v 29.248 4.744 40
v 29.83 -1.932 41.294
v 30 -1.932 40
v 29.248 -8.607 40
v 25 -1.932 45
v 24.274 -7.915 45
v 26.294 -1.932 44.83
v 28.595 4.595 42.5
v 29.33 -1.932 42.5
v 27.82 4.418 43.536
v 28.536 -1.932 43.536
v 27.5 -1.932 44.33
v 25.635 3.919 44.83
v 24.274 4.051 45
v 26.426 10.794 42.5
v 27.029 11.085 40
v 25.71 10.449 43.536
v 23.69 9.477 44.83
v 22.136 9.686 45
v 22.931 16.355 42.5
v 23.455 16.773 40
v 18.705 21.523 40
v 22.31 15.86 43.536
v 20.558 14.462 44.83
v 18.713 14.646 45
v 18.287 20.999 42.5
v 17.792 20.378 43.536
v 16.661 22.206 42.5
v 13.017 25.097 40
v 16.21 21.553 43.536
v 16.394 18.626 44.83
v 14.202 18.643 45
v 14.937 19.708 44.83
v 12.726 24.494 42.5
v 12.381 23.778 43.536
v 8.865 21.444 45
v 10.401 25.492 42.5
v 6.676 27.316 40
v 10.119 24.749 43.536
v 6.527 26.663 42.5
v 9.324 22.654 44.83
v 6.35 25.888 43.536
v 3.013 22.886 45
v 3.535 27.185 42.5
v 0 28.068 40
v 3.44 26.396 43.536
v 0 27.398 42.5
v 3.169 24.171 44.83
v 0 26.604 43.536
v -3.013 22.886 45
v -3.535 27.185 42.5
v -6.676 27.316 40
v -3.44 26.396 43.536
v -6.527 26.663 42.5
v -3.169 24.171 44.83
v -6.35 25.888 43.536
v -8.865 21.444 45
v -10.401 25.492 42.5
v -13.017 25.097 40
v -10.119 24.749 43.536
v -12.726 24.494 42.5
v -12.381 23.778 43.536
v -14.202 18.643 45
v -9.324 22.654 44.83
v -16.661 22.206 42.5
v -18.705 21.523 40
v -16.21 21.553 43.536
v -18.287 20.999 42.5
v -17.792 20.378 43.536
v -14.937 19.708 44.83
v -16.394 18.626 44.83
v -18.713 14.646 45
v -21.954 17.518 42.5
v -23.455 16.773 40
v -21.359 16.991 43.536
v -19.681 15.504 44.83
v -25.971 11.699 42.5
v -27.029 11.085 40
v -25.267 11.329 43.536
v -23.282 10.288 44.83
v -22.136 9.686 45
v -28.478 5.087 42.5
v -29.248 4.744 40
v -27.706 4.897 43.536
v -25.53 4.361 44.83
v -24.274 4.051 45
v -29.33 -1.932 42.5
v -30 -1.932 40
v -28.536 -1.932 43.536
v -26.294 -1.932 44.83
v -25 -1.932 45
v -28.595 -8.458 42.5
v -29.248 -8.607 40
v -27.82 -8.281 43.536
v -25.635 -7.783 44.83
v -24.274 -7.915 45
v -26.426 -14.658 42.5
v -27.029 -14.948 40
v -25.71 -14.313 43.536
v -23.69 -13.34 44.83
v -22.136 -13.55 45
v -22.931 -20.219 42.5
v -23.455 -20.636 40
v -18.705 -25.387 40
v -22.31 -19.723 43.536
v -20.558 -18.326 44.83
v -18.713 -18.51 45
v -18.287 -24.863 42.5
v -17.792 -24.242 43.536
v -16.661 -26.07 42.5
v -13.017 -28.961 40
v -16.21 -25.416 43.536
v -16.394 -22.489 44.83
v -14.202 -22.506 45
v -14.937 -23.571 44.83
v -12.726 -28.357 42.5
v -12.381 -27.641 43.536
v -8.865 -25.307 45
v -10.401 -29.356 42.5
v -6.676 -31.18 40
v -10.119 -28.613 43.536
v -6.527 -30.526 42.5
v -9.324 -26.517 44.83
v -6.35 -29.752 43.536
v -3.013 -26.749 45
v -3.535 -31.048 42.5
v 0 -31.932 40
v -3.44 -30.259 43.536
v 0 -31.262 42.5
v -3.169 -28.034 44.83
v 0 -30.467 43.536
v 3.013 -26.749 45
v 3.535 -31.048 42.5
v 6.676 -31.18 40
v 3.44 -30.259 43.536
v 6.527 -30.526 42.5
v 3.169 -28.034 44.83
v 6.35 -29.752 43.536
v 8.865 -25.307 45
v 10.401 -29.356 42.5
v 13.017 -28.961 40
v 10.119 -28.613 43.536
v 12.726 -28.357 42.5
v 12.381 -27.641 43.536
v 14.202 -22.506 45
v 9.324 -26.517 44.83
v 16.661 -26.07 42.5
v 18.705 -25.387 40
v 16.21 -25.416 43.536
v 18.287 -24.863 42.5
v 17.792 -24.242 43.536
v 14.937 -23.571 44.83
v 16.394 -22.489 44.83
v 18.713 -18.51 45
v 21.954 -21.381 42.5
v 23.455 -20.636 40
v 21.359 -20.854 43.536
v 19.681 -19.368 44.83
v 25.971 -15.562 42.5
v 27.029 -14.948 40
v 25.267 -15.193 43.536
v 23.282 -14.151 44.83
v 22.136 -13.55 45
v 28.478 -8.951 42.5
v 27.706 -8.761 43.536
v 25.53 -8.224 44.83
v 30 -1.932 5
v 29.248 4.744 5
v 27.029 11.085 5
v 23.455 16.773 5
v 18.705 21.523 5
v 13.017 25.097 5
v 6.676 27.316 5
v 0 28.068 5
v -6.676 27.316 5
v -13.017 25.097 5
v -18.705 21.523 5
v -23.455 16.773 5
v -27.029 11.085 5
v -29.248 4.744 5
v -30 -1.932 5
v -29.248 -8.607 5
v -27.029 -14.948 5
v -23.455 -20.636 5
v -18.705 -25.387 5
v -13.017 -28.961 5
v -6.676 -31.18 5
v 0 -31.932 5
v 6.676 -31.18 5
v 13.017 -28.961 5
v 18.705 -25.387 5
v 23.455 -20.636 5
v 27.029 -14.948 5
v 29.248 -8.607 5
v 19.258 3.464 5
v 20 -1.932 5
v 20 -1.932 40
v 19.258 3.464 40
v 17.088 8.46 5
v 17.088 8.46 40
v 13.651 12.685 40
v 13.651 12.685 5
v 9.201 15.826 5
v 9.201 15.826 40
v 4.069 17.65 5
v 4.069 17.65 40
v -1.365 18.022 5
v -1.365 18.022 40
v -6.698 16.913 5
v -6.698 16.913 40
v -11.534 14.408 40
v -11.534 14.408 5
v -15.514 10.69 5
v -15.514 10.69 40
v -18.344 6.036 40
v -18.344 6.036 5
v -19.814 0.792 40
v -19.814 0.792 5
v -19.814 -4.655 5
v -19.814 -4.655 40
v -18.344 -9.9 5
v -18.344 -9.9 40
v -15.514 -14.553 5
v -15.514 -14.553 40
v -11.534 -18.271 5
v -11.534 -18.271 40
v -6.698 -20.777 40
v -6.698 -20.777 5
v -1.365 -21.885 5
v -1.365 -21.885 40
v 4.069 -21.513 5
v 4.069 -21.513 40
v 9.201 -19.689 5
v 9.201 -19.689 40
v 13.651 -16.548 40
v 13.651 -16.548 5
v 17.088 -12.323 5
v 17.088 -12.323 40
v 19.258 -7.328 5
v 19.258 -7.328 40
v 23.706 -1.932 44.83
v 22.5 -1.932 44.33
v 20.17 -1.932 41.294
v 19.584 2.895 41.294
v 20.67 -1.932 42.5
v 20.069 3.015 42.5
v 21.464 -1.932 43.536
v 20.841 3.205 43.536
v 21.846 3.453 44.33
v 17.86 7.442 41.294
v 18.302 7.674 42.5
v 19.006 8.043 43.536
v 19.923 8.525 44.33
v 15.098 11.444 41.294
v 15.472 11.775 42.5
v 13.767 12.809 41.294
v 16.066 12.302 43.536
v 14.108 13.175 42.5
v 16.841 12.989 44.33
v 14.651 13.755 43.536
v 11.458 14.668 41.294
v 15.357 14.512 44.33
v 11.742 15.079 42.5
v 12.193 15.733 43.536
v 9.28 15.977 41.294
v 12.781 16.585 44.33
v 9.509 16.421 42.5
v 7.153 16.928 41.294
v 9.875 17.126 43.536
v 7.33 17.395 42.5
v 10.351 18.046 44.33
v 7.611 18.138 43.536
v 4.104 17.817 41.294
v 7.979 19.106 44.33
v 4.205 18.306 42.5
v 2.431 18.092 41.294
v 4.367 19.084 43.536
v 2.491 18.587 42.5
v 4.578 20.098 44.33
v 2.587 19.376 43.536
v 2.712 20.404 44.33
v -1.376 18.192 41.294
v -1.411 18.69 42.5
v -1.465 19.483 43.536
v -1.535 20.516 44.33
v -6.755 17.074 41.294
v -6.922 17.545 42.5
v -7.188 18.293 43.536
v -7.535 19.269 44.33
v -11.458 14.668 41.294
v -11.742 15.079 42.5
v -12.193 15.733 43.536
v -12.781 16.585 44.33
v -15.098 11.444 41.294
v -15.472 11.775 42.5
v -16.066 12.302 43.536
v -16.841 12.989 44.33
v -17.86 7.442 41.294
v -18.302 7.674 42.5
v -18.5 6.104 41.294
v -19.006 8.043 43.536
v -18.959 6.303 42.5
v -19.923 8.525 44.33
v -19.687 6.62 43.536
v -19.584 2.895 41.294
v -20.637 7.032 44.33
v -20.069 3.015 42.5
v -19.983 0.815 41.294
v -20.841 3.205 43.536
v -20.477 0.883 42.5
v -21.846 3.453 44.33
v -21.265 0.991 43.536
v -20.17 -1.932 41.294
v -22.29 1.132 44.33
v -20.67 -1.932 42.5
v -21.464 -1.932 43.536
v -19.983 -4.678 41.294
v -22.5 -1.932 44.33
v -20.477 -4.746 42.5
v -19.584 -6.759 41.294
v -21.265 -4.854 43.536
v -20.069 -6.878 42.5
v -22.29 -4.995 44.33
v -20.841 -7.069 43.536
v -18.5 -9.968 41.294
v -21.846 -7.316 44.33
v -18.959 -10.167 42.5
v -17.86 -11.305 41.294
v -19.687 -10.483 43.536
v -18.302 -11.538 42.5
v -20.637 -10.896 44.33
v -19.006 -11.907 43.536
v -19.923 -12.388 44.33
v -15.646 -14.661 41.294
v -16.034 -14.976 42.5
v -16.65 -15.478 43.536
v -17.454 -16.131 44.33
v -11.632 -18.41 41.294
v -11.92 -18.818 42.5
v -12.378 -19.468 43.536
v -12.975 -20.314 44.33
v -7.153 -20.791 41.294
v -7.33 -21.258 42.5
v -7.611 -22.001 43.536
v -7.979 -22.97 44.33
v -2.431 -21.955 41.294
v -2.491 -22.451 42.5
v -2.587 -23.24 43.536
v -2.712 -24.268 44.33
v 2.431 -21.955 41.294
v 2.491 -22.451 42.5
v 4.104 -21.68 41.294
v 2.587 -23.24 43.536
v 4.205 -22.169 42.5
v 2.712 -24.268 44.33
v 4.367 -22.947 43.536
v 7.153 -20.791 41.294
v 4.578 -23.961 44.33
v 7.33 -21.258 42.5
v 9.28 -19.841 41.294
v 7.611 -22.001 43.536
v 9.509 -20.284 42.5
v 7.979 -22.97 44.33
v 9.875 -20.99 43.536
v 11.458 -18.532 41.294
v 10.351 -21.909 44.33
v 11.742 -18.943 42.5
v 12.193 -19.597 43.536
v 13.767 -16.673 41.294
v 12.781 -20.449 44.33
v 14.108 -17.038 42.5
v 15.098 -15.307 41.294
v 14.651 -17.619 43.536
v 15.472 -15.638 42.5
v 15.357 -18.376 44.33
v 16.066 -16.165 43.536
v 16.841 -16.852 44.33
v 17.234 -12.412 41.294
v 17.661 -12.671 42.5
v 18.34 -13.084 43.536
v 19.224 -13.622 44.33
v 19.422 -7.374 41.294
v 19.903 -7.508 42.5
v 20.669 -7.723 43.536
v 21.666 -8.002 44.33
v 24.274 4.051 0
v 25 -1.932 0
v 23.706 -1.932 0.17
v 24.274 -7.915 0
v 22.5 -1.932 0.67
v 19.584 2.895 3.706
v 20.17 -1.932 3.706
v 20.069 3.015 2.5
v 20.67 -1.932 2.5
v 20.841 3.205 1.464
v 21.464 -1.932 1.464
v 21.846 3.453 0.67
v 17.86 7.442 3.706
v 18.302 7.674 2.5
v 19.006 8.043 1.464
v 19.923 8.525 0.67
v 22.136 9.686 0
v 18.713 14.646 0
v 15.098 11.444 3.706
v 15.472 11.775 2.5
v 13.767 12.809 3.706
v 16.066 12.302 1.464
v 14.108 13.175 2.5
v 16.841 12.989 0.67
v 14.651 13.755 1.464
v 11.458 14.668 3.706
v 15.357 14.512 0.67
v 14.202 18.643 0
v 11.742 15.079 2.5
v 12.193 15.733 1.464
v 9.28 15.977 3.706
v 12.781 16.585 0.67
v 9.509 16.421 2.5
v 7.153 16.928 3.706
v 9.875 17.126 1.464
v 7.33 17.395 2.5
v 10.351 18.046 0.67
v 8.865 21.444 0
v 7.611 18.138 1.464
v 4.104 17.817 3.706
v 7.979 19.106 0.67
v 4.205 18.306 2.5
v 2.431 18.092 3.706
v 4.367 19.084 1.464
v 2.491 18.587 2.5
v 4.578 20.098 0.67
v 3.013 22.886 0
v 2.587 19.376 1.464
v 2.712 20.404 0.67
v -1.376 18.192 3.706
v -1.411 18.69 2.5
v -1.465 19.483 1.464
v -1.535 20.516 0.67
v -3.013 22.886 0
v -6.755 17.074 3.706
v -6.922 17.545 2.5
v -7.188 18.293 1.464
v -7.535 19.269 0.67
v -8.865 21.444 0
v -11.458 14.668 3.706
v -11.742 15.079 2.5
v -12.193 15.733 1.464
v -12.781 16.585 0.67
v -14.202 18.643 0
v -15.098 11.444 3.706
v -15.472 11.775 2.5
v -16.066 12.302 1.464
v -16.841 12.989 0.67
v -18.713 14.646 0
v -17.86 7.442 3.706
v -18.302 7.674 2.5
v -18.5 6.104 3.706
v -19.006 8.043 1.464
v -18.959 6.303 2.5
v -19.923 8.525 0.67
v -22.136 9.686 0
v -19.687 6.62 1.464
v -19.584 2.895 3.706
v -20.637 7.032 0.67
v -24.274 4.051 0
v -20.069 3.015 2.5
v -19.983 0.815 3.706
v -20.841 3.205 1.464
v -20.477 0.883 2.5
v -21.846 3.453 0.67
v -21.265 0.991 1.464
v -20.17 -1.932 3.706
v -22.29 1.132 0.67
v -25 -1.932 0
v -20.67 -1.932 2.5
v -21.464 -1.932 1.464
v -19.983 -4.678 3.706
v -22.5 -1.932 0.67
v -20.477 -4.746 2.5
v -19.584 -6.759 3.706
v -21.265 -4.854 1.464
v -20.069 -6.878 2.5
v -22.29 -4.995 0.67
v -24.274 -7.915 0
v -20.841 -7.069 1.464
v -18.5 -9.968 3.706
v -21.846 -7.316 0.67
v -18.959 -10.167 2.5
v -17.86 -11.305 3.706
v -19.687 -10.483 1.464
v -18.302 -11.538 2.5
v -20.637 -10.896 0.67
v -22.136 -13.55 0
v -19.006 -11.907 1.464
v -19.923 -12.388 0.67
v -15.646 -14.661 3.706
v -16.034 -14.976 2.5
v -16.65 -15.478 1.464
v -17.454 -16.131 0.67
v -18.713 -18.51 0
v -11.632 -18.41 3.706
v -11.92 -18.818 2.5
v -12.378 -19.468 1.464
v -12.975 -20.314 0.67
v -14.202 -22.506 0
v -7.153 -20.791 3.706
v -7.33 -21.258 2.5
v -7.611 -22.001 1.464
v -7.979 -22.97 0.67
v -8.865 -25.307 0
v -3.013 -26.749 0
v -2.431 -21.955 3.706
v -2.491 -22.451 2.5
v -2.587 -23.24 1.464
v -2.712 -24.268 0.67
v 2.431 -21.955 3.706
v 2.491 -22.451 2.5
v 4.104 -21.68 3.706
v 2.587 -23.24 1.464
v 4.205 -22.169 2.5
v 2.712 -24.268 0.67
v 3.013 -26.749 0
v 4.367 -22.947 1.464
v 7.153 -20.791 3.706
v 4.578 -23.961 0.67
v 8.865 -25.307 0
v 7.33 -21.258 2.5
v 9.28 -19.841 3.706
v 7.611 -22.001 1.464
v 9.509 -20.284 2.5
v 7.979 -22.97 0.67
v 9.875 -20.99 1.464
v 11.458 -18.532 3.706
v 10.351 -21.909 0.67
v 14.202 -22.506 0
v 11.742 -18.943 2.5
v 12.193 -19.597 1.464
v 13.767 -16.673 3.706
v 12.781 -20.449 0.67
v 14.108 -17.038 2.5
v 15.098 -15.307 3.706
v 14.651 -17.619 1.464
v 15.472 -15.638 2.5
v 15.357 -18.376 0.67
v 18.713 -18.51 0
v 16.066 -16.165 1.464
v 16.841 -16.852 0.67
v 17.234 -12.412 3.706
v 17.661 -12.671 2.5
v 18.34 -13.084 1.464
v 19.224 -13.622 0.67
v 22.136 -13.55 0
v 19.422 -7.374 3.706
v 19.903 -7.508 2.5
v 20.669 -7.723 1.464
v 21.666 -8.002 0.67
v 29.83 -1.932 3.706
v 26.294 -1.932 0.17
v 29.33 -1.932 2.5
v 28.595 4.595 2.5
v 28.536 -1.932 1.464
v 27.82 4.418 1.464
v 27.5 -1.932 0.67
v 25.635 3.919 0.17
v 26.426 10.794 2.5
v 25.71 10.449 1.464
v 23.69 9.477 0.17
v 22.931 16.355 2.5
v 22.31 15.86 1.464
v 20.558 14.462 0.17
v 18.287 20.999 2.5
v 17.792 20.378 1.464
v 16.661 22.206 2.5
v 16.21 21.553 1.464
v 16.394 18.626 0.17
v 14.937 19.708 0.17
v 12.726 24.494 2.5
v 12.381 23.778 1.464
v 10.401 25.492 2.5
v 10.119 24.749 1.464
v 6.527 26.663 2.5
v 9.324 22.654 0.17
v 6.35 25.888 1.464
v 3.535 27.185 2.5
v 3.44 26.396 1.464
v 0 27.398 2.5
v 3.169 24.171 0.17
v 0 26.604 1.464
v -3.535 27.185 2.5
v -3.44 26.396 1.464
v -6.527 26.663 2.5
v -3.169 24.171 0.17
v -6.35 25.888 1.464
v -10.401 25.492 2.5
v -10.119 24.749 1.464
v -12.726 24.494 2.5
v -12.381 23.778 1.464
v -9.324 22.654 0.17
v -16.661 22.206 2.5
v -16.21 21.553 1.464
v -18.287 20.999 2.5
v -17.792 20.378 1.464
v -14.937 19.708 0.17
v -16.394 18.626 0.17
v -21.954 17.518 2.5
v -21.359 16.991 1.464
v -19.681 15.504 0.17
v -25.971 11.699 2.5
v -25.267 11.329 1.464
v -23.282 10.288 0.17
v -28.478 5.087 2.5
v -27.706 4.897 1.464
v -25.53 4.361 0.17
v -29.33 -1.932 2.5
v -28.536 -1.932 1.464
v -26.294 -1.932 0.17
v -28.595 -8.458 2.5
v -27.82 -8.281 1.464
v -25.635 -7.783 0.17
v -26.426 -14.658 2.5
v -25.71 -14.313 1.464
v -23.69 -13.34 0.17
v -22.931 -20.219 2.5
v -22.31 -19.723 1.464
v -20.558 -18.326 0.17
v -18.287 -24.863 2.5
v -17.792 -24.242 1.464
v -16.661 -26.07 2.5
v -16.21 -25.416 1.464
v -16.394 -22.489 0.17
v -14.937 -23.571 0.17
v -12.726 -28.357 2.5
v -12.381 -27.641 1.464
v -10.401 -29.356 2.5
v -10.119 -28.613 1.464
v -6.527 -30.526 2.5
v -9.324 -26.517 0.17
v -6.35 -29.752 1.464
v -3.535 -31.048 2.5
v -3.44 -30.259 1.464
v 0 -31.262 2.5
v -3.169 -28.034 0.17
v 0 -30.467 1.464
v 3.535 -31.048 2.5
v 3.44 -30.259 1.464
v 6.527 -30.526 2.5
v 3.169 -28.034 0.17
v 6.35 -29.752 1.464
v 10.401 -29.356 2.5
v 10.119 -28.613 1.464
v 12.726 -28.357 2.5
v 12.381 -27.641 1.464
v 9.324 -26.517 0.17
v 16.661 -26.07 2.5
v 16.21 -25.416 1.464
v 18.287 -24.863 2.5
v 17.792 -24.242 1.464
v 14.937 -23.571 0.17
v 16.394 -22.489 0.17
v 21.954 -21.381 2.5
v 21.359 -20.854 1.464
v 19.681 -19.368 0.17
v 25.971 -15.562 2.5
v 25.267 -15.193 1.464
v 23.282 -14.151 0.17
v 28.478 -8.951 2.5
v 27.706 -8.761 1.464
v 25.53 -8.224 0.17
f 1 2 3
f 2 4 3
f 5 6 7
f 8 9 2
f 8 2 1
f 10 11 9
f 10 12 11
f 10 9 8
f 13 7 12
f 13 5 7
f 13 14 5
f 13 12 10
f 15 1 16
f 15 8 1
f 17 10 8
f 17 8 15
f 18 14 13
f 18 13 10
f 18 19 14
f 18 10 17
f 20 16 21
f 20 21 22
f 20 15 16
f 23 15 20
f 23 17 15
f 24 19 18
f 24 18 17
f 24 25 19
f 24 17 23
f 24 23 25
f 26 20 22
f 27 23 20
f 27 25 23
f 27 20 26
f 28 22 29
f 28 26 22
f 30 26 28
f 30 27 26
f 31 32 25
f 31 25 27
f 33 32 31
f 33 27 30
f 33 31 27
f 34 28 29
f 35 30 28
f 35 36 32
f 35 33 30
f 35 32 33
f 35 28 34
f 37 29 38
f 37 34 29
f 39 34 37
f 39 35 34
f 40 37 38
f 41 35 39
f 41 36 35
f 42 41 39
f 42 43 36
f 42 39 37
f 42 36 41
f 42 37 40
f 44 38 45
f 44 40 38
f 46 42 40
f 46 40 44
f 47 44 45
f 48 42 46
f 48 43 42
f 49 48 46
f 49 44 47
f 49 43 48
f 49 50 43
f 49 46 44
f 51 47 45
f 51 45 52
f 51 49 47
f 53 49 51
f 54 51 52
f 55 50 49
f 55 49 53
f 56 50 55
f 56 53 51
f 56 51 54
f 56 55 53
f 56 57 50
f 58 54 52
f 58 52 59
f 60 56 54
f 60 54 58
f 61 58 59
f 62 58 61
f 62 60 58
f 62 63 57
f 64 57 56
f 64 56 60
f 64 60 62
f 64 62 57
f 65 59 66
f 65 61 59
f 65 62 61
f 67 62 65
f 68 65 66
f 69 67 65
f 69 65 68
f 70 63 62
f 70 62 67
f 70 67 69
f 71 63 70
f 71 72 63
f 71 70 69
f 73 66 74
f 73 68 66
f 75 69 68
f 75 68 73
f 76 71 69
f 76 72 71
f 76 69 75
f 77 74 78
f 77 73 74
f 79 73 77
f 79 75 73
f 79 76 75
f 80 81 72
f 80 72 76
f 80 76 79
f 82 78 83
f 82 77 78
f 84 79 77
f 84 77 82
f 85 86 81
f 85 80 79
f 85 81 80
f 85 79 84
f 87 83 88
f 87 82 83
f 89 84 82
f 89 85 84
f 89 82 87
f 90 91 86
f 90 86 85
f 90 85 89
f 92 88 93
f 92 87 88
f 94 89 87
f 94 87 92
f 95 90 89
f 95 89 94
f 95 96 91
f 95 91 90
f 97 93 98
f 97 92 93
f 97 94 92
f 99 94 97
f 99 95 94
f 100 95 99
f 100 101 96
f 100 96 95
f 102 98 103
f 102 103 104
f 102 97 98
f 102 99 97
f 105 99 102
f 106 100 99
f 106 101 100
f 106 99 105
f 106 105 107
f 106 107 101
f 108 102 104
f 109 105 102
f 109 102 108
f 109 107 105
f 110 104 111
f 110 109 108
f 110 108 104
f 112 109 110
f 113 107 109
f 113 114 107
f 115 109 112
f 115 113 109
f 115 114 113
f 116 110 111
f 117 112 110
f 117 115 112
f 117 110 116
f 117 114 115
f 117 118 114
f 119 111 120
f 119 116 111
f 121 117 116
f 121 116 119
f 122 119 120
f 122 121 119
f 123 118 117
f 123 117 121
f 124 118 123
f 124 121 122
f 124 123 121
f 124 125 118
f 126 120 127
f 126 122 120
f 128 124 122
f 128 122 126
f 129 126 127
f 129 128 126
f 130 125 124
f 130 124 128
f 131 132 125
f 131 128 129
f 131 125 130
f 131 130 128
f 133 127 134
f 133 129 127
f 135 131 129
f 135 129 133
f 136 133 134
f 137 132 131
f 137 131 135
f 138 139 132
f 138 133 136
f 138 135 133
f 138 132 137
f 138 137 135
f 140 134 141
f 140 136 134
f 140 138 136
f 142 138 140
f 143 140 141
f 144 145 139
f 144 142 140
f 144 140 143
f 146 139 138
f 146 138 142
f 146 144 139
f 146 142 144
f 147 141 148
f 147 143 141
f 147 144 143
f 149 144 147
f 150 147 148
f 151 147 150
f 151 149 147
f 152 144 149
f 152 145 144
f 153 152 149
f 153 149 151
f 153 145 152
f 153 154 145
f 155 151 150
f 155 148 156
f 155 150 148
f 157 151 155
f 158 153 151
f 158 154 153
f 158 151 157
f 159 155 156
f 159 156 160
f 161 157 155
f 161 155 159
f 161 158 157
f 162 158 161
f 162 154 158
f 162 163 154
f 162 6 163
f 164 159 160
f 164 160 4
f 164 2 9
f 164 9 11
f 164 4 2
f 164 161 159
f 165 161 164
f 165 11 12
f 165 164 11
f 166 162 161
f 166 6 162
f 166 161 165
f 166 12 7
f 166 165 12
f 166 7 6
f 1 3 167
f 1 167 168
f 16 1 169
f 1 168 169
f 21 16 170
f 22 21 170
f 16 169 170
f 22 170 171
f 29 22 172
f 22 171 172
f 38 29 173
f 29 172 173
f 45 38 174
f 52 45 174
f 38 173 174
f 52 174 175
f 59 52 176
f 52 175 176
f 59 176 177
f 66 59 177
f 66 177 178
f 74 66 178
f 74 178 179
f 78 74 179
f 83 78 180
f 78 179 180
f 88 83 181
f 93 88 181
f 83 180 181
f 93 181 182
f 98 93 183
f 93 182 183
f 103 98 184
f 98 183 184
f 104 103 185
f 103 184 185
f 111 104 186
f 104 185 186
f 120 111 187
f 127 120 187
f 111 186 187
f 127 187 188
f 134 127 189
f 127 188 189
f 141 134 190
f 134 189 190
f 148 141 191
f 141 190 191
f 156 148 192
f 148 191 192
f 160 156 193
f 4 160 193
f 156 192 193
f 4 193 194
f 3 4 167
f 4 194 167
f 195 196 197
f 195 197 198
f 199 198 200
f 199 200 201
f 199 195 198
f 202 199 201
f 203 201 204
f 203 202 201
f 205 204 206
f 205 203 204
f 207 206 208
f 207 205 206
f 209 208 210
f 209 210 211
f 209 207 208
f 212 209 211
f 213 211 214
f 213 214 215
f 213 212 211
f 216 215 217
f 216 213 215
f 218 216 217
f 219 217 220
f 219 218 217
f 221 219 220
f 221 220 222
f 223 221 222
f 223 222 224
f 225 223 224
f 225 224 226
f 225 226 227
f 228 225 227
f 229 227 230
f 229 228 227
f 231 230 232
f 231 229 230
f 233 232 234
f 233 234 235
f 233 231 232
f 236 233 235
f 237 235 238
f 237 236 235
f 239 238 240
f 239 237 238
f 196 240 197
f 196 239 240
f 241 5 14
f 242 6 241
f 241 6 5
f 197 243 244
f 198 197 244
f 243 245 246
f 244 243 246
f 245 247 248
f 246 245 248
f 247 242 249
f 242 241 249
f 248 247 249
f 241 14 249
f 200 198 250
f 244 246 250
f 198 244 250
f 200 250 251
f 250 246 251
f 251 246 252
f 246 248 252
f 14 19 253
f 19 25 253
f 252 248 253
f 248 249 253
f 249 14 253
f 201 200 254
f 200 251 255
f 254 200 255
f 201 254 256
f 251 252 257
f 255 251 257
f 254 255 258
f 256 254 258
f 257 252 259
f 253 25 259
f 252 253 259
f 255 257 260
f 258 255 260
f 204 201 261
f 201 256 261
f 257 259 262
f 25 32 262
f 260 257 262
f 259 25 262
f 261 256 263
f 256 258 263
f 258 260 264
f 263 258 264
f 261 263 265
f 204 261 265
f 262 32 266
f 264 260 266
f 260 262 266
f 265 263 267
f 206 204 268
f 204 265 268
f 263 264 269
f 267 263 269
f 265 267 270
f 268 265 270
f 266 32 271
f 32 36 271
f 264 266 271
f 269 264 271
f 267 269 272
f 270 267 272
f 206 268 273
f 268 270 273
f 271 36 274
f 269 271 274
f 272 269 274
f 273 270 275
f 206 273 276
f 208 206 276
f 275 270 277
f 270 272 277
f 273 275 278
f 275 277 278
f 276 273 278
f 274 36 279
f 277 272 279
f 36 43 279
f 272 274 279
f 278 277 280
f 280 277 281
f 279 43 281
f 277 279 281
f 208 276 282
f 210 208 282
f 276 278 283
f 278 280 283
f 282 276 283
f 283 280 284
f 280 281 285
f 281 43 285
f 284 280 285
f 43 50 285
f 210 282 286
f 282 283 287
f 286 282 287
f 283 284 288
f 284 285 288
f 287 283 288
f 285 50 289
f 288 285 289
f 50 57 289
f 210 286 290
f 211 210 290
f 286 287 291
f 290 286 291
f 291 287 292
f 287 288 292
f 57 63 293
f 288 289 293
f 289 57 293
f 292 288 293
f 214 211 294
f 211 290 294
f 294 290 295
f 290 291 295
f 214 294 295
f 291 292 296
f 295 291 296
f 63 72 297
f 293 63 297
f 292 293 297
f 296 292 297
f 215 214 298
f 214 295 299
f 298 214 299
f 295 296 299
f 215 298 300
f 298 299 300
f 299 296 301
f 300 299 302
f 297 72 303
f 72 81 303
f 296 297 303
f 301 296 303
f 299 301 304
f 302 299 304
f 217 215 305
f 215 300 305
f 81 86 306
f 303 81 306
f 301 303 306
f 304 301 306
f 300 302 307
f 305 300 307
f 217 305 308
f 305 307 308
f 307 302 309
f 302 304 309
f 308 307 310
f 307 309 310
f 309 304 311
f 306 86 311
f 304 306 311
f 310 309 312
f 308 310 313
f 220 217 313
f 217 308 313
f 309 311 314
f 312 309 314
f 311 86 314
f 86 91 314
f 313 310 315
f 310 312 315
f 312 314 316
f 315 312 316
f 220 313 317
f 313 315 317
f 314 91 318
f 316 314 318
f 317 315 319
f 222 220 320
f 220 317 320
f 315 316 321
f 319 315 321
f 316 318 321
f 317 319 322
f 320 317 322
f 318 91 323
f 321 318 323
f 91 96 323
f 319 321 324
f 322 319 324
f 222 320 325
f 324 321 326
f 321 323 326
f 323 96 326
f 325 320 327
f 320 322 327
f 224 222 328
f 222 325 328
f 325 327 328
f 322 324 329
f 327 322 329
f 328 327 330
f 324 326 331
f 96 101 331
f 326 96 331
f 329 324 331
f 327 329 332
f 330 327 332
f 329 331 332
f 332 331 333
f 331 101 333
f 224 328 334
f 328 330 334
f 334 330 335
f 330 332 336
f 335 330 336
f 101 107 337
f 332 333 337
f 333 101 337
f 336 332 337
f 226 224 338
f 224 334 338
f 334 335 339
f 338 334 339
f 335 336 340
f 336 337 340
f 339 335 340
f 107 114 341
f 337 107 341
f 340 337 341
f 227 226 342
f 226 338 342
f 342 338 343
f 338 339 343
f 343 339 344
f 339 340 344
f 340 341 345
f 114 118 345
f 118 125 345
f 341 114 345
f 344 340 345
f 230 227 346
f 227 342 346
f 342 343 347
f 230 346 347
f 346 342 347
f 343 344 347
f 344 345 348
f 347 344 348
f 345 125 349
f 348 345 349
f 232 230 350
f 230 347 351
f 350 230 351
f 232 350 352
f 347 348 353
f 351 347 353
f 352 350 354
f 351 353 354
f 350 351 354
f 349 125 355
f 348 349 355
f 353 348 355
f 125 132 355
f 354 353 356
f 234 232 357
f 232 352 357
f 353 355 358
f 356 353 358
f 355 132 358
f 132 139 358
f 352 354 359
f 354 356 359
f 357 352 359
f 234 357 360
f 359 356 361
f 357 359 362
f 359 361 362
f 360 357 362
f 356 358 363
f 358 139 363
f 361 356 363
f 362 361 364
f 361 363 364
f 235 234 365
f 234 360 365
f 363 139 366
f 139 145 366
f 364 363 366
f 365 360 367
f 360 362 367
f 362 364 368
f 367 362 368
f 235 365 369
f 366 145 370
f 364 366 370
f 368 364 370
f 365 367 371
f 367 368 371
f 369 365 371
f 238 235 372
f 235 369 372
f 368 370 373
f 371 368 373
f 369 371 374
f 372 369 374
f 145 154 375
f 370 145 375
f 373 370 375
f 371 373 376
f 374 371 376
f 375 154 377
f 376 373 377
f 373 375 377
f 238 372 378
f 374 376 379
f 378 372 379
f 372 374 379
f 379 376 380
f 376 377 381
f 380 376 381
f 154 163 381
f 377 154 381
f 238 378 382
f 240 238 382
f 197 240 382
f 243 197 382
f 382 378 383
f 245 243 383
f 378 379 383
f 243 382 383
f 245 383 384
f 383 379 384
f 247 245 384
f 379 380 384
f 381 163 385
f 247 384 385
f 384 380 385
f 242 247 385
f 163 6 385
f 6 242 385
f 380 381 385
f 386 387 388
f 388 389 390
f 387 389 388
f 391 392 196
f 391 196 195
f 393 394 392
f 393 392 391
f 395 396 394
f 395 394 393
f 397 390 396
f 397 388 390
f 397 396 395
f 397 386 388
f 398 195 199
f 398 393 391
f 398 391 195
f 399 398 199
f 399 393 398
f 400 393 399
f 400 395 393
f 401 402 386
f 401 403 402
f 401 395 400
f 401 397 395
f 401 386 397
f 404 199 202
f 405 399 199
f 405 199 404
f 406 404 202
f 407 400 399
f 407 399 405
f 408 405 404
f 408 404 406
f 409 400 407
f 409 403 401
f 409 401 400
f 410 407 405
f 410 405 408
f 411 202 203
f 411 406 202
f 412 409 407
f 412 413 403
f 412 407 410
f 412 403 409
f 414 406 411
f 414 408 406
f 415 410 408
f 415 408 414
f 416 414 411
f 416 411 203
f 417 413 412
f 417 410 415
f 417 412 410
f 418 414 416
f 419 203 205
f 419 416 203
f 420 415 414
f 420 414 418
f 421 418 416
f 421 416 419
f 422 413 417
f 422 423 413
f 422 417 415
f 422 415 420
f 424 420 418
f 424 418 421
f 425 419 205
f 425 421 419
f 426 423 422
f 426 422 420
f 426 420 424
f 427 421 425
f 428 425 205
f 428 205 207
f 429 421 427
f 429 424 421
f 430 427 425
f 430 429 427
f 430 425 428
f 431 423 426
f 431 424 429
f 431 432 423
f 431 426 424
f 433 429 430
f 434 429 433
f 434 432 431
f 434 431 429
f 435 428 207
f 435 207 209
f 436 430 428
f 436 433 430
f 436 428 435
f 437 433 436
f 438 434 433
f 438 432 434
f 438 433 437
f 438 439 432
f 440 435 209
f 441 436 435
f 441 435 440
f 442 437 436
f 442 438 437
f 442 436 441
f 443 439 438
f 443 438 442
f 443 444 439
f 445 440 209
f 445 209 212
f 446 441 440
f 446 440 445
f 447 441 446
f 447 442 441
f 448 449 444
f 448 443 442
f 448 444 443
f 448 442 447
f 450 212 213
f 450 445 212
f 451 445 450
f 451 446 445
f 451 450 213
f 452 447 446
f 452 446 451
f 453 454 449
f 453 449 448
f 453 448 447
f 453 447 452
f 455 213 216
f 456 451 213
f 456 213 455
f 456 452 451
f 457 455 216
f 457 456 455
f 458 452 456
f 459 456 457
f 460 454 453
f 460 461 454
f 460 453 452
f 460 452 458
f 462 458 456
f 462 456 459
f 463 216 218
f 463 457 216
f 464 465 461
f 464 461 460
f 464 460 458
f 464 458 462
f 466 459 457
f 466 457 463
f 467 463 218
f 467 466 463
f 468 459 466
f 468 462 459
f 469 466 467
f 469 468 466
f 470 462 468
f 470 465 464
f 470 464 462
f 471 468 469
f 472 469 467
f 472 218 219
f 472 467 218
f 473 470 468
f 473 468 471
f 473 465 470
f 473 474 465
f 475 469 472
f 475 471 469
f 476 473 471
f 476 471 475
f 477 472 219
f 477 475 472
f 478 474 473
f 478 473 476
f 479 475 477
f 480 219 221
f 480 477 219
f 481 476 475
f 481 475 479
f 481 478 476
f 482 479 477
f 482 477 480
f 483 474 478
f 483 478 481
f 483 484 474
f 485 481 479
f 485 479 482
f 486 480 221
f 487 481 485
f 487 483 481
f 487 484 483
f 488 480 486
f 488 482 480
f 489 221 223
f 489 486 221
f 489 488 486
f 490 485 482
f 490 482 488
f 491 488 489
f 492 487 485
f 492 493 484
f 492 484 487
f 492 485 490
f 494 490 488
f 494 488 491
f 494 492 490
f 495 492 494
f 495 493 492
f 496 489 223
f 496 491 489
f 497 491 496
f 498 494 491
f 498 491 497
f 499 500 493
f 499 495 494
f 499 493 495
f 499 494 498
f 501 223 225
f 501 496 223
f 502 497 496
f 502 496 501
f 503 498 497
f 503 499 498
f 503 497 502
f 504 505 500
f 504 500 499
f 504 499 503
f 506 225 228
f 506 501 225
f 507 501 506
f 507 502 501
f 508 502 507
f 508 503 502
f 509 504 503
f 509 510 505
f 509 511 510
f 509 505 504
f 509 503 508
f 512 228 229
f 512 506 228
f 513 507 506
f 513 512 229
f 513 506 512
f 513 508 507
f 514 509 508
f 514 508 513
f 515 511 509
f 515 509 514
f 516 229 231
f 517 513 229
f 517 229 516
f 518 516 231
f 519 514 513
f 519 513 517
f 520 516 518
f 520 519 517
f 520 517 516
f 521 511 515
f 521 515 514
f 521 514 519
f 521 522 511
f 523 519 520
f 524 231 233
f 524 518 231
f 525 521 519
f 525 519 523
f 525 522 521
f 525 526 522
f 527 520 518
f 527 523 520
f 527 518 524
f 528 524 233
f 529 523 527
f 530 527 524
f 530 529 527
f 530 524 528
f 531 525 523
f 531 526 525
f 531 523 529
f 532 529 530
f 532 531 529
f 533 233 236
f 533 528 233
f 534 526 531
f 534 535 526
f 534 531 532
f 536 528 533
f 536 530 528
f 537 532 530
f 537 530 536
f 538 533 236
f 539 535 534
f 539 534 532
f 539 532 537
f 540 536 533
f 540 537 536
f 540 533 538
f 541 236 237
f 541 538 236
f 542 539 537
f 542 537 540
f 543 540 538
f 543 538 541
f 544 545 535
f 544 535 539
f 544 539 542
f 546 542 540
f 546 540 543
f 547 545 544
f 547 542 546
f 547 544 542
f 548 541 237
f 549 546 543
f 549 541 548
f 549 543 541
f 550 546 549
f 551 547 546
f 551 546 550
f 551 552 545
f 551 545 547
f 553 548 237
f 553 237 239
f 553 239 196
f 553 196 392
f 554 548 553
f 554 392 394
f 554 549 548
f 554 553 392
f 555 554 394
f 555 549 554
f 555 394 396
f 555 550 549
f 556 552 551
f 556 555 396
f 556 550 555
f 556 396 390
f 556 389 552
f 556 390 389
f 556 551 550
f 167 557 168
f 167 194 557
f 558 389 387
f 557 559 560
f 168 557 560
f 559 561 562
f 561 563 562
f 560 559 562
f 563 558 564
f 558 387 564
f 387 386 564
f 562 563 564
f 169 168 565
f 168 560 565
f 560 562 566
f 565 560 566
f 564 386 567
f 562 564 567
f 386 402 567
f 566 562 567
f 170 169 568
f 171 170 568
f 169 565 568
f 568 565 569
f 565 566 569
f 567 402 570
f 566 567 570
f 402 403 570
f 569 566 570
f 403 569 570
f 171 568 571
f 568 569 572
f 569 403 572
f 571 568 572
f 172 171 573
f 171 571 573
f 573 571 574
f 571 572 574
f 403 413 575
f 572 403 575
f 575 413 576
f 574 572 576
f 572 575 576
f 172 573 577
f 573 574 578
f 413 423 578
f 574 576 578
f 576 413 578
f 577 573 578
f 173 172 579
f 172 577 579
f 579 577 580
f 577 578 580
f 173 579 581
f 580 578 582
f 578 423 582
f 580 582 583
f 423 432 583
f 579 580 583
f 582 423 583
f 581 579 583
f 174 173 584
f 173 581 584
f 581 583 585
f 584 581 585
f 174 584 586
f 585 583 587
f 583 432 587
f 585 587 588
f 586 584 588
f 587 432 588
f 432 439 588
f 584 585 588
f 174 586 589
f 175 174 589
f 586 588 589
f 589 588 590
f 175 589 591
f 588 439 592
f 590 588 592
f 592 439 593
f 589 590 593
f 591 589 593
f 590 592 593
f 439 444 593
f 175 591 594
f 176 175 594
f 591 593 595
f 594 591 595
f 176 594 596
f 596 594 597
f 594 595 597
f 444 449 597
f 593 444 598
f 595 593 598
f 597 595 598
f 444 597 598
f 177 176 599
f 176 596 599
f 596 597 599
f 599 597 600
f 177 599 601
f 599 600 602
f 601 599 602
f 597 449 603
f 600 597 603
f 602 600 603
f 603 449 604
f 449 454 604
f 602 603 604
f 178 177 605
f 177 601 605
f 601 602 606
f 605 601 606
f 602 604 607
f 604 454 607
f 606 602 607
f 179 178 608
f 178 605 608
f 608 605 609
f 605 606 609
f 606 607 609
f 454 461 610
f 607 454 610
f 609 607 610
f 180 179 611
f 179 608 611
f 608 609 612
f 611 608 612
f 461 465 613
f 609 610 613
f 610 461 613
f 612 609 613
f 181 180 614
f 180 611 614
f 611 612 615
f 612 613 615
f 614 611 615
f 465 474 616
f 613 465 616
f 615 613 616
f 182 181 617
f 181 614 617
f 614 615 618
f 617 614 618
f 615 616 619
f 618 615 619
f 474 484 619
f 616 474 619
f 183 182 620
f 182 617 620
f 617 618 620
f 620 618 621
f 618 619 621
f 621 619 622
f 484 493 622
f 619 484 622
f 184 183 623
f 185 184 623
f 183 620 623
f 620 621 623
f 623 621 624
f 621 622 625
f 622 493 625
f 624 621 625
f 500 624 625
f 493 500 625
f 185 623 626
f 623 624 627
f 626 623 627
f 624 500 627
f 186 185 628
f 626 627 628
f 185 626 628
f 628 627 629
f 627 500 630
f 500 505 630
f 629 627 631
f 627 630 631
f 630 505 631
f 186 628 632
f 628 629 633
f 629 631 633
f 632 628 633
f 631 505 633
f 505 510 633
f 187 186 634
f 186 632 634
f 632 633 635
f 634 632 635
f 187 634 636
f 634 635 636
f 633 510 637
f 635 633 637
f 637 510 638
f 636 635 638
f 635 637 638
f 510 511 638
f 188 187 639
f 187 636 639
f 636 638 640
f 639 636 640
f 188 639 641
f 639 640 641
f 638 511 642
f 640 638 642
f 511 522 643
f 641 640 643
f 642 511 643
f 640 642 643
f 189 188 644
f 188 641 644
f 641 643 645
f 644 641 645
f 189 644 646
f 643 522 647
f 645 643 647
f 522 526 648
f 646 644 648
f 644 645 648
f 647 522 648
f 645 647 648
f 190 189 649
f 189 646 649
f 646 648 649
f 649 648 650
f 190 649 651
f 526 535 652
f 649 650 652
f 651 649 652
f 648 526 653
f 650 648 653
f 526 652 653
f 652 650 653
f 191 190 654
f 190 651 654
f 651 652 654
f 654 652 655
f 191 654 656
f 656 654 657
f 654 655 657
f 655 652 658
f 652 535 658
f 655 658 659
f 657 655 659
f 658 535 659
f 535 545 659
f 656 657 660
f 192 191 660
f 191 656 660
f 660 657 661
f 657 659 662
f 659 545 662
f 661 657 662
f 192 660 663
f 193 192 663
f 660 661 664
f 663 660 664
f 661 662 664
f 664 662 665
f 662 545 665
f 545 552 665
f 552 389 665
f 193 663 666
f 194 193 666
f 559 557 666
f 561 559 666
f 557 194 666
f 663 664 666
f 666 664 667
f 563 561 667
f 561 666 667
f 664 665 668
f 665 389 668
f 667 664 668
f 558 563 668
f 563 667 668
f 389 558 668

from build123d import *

# Parameters (mm, degrees)
F0_R     = 30
F0_R_2   = 20
F1_DEPTH = 45
F2_R     = 4.99999


# Not quite as in the source:
# - a fillet or chamfer is up to 0.001 mm smaller than in the source, because OpenCascade refuses the exact size


with BuildPart() as f1:
    # F0 (on Top) → F1 (new body)
    with BuildSketch(Plane.XY):
        with Locations((0, -1.9317325205)):
            Circle(F0_R)
        with Locations((0, -1.9317325205)):
            Circle(F0_R_2, mode=Mode.SUBTRACT)
    extrude(amount=F1_DEPTH)

    # F2 (radius 5 in the source; OpenCascade refuses exactly that, so slightly less here)
    f2_edges = [f1.edges().sort_by_distance(p)[0] for p in [
        (-30, -1.931733, 0),
        (-20, -1.931733, 0),
        (-20, -1.931733, 45),
        (-30, -1.931733, 45),
    ]]
    fillet(f2_edges, radius=F2_R)


solid = f1.part
